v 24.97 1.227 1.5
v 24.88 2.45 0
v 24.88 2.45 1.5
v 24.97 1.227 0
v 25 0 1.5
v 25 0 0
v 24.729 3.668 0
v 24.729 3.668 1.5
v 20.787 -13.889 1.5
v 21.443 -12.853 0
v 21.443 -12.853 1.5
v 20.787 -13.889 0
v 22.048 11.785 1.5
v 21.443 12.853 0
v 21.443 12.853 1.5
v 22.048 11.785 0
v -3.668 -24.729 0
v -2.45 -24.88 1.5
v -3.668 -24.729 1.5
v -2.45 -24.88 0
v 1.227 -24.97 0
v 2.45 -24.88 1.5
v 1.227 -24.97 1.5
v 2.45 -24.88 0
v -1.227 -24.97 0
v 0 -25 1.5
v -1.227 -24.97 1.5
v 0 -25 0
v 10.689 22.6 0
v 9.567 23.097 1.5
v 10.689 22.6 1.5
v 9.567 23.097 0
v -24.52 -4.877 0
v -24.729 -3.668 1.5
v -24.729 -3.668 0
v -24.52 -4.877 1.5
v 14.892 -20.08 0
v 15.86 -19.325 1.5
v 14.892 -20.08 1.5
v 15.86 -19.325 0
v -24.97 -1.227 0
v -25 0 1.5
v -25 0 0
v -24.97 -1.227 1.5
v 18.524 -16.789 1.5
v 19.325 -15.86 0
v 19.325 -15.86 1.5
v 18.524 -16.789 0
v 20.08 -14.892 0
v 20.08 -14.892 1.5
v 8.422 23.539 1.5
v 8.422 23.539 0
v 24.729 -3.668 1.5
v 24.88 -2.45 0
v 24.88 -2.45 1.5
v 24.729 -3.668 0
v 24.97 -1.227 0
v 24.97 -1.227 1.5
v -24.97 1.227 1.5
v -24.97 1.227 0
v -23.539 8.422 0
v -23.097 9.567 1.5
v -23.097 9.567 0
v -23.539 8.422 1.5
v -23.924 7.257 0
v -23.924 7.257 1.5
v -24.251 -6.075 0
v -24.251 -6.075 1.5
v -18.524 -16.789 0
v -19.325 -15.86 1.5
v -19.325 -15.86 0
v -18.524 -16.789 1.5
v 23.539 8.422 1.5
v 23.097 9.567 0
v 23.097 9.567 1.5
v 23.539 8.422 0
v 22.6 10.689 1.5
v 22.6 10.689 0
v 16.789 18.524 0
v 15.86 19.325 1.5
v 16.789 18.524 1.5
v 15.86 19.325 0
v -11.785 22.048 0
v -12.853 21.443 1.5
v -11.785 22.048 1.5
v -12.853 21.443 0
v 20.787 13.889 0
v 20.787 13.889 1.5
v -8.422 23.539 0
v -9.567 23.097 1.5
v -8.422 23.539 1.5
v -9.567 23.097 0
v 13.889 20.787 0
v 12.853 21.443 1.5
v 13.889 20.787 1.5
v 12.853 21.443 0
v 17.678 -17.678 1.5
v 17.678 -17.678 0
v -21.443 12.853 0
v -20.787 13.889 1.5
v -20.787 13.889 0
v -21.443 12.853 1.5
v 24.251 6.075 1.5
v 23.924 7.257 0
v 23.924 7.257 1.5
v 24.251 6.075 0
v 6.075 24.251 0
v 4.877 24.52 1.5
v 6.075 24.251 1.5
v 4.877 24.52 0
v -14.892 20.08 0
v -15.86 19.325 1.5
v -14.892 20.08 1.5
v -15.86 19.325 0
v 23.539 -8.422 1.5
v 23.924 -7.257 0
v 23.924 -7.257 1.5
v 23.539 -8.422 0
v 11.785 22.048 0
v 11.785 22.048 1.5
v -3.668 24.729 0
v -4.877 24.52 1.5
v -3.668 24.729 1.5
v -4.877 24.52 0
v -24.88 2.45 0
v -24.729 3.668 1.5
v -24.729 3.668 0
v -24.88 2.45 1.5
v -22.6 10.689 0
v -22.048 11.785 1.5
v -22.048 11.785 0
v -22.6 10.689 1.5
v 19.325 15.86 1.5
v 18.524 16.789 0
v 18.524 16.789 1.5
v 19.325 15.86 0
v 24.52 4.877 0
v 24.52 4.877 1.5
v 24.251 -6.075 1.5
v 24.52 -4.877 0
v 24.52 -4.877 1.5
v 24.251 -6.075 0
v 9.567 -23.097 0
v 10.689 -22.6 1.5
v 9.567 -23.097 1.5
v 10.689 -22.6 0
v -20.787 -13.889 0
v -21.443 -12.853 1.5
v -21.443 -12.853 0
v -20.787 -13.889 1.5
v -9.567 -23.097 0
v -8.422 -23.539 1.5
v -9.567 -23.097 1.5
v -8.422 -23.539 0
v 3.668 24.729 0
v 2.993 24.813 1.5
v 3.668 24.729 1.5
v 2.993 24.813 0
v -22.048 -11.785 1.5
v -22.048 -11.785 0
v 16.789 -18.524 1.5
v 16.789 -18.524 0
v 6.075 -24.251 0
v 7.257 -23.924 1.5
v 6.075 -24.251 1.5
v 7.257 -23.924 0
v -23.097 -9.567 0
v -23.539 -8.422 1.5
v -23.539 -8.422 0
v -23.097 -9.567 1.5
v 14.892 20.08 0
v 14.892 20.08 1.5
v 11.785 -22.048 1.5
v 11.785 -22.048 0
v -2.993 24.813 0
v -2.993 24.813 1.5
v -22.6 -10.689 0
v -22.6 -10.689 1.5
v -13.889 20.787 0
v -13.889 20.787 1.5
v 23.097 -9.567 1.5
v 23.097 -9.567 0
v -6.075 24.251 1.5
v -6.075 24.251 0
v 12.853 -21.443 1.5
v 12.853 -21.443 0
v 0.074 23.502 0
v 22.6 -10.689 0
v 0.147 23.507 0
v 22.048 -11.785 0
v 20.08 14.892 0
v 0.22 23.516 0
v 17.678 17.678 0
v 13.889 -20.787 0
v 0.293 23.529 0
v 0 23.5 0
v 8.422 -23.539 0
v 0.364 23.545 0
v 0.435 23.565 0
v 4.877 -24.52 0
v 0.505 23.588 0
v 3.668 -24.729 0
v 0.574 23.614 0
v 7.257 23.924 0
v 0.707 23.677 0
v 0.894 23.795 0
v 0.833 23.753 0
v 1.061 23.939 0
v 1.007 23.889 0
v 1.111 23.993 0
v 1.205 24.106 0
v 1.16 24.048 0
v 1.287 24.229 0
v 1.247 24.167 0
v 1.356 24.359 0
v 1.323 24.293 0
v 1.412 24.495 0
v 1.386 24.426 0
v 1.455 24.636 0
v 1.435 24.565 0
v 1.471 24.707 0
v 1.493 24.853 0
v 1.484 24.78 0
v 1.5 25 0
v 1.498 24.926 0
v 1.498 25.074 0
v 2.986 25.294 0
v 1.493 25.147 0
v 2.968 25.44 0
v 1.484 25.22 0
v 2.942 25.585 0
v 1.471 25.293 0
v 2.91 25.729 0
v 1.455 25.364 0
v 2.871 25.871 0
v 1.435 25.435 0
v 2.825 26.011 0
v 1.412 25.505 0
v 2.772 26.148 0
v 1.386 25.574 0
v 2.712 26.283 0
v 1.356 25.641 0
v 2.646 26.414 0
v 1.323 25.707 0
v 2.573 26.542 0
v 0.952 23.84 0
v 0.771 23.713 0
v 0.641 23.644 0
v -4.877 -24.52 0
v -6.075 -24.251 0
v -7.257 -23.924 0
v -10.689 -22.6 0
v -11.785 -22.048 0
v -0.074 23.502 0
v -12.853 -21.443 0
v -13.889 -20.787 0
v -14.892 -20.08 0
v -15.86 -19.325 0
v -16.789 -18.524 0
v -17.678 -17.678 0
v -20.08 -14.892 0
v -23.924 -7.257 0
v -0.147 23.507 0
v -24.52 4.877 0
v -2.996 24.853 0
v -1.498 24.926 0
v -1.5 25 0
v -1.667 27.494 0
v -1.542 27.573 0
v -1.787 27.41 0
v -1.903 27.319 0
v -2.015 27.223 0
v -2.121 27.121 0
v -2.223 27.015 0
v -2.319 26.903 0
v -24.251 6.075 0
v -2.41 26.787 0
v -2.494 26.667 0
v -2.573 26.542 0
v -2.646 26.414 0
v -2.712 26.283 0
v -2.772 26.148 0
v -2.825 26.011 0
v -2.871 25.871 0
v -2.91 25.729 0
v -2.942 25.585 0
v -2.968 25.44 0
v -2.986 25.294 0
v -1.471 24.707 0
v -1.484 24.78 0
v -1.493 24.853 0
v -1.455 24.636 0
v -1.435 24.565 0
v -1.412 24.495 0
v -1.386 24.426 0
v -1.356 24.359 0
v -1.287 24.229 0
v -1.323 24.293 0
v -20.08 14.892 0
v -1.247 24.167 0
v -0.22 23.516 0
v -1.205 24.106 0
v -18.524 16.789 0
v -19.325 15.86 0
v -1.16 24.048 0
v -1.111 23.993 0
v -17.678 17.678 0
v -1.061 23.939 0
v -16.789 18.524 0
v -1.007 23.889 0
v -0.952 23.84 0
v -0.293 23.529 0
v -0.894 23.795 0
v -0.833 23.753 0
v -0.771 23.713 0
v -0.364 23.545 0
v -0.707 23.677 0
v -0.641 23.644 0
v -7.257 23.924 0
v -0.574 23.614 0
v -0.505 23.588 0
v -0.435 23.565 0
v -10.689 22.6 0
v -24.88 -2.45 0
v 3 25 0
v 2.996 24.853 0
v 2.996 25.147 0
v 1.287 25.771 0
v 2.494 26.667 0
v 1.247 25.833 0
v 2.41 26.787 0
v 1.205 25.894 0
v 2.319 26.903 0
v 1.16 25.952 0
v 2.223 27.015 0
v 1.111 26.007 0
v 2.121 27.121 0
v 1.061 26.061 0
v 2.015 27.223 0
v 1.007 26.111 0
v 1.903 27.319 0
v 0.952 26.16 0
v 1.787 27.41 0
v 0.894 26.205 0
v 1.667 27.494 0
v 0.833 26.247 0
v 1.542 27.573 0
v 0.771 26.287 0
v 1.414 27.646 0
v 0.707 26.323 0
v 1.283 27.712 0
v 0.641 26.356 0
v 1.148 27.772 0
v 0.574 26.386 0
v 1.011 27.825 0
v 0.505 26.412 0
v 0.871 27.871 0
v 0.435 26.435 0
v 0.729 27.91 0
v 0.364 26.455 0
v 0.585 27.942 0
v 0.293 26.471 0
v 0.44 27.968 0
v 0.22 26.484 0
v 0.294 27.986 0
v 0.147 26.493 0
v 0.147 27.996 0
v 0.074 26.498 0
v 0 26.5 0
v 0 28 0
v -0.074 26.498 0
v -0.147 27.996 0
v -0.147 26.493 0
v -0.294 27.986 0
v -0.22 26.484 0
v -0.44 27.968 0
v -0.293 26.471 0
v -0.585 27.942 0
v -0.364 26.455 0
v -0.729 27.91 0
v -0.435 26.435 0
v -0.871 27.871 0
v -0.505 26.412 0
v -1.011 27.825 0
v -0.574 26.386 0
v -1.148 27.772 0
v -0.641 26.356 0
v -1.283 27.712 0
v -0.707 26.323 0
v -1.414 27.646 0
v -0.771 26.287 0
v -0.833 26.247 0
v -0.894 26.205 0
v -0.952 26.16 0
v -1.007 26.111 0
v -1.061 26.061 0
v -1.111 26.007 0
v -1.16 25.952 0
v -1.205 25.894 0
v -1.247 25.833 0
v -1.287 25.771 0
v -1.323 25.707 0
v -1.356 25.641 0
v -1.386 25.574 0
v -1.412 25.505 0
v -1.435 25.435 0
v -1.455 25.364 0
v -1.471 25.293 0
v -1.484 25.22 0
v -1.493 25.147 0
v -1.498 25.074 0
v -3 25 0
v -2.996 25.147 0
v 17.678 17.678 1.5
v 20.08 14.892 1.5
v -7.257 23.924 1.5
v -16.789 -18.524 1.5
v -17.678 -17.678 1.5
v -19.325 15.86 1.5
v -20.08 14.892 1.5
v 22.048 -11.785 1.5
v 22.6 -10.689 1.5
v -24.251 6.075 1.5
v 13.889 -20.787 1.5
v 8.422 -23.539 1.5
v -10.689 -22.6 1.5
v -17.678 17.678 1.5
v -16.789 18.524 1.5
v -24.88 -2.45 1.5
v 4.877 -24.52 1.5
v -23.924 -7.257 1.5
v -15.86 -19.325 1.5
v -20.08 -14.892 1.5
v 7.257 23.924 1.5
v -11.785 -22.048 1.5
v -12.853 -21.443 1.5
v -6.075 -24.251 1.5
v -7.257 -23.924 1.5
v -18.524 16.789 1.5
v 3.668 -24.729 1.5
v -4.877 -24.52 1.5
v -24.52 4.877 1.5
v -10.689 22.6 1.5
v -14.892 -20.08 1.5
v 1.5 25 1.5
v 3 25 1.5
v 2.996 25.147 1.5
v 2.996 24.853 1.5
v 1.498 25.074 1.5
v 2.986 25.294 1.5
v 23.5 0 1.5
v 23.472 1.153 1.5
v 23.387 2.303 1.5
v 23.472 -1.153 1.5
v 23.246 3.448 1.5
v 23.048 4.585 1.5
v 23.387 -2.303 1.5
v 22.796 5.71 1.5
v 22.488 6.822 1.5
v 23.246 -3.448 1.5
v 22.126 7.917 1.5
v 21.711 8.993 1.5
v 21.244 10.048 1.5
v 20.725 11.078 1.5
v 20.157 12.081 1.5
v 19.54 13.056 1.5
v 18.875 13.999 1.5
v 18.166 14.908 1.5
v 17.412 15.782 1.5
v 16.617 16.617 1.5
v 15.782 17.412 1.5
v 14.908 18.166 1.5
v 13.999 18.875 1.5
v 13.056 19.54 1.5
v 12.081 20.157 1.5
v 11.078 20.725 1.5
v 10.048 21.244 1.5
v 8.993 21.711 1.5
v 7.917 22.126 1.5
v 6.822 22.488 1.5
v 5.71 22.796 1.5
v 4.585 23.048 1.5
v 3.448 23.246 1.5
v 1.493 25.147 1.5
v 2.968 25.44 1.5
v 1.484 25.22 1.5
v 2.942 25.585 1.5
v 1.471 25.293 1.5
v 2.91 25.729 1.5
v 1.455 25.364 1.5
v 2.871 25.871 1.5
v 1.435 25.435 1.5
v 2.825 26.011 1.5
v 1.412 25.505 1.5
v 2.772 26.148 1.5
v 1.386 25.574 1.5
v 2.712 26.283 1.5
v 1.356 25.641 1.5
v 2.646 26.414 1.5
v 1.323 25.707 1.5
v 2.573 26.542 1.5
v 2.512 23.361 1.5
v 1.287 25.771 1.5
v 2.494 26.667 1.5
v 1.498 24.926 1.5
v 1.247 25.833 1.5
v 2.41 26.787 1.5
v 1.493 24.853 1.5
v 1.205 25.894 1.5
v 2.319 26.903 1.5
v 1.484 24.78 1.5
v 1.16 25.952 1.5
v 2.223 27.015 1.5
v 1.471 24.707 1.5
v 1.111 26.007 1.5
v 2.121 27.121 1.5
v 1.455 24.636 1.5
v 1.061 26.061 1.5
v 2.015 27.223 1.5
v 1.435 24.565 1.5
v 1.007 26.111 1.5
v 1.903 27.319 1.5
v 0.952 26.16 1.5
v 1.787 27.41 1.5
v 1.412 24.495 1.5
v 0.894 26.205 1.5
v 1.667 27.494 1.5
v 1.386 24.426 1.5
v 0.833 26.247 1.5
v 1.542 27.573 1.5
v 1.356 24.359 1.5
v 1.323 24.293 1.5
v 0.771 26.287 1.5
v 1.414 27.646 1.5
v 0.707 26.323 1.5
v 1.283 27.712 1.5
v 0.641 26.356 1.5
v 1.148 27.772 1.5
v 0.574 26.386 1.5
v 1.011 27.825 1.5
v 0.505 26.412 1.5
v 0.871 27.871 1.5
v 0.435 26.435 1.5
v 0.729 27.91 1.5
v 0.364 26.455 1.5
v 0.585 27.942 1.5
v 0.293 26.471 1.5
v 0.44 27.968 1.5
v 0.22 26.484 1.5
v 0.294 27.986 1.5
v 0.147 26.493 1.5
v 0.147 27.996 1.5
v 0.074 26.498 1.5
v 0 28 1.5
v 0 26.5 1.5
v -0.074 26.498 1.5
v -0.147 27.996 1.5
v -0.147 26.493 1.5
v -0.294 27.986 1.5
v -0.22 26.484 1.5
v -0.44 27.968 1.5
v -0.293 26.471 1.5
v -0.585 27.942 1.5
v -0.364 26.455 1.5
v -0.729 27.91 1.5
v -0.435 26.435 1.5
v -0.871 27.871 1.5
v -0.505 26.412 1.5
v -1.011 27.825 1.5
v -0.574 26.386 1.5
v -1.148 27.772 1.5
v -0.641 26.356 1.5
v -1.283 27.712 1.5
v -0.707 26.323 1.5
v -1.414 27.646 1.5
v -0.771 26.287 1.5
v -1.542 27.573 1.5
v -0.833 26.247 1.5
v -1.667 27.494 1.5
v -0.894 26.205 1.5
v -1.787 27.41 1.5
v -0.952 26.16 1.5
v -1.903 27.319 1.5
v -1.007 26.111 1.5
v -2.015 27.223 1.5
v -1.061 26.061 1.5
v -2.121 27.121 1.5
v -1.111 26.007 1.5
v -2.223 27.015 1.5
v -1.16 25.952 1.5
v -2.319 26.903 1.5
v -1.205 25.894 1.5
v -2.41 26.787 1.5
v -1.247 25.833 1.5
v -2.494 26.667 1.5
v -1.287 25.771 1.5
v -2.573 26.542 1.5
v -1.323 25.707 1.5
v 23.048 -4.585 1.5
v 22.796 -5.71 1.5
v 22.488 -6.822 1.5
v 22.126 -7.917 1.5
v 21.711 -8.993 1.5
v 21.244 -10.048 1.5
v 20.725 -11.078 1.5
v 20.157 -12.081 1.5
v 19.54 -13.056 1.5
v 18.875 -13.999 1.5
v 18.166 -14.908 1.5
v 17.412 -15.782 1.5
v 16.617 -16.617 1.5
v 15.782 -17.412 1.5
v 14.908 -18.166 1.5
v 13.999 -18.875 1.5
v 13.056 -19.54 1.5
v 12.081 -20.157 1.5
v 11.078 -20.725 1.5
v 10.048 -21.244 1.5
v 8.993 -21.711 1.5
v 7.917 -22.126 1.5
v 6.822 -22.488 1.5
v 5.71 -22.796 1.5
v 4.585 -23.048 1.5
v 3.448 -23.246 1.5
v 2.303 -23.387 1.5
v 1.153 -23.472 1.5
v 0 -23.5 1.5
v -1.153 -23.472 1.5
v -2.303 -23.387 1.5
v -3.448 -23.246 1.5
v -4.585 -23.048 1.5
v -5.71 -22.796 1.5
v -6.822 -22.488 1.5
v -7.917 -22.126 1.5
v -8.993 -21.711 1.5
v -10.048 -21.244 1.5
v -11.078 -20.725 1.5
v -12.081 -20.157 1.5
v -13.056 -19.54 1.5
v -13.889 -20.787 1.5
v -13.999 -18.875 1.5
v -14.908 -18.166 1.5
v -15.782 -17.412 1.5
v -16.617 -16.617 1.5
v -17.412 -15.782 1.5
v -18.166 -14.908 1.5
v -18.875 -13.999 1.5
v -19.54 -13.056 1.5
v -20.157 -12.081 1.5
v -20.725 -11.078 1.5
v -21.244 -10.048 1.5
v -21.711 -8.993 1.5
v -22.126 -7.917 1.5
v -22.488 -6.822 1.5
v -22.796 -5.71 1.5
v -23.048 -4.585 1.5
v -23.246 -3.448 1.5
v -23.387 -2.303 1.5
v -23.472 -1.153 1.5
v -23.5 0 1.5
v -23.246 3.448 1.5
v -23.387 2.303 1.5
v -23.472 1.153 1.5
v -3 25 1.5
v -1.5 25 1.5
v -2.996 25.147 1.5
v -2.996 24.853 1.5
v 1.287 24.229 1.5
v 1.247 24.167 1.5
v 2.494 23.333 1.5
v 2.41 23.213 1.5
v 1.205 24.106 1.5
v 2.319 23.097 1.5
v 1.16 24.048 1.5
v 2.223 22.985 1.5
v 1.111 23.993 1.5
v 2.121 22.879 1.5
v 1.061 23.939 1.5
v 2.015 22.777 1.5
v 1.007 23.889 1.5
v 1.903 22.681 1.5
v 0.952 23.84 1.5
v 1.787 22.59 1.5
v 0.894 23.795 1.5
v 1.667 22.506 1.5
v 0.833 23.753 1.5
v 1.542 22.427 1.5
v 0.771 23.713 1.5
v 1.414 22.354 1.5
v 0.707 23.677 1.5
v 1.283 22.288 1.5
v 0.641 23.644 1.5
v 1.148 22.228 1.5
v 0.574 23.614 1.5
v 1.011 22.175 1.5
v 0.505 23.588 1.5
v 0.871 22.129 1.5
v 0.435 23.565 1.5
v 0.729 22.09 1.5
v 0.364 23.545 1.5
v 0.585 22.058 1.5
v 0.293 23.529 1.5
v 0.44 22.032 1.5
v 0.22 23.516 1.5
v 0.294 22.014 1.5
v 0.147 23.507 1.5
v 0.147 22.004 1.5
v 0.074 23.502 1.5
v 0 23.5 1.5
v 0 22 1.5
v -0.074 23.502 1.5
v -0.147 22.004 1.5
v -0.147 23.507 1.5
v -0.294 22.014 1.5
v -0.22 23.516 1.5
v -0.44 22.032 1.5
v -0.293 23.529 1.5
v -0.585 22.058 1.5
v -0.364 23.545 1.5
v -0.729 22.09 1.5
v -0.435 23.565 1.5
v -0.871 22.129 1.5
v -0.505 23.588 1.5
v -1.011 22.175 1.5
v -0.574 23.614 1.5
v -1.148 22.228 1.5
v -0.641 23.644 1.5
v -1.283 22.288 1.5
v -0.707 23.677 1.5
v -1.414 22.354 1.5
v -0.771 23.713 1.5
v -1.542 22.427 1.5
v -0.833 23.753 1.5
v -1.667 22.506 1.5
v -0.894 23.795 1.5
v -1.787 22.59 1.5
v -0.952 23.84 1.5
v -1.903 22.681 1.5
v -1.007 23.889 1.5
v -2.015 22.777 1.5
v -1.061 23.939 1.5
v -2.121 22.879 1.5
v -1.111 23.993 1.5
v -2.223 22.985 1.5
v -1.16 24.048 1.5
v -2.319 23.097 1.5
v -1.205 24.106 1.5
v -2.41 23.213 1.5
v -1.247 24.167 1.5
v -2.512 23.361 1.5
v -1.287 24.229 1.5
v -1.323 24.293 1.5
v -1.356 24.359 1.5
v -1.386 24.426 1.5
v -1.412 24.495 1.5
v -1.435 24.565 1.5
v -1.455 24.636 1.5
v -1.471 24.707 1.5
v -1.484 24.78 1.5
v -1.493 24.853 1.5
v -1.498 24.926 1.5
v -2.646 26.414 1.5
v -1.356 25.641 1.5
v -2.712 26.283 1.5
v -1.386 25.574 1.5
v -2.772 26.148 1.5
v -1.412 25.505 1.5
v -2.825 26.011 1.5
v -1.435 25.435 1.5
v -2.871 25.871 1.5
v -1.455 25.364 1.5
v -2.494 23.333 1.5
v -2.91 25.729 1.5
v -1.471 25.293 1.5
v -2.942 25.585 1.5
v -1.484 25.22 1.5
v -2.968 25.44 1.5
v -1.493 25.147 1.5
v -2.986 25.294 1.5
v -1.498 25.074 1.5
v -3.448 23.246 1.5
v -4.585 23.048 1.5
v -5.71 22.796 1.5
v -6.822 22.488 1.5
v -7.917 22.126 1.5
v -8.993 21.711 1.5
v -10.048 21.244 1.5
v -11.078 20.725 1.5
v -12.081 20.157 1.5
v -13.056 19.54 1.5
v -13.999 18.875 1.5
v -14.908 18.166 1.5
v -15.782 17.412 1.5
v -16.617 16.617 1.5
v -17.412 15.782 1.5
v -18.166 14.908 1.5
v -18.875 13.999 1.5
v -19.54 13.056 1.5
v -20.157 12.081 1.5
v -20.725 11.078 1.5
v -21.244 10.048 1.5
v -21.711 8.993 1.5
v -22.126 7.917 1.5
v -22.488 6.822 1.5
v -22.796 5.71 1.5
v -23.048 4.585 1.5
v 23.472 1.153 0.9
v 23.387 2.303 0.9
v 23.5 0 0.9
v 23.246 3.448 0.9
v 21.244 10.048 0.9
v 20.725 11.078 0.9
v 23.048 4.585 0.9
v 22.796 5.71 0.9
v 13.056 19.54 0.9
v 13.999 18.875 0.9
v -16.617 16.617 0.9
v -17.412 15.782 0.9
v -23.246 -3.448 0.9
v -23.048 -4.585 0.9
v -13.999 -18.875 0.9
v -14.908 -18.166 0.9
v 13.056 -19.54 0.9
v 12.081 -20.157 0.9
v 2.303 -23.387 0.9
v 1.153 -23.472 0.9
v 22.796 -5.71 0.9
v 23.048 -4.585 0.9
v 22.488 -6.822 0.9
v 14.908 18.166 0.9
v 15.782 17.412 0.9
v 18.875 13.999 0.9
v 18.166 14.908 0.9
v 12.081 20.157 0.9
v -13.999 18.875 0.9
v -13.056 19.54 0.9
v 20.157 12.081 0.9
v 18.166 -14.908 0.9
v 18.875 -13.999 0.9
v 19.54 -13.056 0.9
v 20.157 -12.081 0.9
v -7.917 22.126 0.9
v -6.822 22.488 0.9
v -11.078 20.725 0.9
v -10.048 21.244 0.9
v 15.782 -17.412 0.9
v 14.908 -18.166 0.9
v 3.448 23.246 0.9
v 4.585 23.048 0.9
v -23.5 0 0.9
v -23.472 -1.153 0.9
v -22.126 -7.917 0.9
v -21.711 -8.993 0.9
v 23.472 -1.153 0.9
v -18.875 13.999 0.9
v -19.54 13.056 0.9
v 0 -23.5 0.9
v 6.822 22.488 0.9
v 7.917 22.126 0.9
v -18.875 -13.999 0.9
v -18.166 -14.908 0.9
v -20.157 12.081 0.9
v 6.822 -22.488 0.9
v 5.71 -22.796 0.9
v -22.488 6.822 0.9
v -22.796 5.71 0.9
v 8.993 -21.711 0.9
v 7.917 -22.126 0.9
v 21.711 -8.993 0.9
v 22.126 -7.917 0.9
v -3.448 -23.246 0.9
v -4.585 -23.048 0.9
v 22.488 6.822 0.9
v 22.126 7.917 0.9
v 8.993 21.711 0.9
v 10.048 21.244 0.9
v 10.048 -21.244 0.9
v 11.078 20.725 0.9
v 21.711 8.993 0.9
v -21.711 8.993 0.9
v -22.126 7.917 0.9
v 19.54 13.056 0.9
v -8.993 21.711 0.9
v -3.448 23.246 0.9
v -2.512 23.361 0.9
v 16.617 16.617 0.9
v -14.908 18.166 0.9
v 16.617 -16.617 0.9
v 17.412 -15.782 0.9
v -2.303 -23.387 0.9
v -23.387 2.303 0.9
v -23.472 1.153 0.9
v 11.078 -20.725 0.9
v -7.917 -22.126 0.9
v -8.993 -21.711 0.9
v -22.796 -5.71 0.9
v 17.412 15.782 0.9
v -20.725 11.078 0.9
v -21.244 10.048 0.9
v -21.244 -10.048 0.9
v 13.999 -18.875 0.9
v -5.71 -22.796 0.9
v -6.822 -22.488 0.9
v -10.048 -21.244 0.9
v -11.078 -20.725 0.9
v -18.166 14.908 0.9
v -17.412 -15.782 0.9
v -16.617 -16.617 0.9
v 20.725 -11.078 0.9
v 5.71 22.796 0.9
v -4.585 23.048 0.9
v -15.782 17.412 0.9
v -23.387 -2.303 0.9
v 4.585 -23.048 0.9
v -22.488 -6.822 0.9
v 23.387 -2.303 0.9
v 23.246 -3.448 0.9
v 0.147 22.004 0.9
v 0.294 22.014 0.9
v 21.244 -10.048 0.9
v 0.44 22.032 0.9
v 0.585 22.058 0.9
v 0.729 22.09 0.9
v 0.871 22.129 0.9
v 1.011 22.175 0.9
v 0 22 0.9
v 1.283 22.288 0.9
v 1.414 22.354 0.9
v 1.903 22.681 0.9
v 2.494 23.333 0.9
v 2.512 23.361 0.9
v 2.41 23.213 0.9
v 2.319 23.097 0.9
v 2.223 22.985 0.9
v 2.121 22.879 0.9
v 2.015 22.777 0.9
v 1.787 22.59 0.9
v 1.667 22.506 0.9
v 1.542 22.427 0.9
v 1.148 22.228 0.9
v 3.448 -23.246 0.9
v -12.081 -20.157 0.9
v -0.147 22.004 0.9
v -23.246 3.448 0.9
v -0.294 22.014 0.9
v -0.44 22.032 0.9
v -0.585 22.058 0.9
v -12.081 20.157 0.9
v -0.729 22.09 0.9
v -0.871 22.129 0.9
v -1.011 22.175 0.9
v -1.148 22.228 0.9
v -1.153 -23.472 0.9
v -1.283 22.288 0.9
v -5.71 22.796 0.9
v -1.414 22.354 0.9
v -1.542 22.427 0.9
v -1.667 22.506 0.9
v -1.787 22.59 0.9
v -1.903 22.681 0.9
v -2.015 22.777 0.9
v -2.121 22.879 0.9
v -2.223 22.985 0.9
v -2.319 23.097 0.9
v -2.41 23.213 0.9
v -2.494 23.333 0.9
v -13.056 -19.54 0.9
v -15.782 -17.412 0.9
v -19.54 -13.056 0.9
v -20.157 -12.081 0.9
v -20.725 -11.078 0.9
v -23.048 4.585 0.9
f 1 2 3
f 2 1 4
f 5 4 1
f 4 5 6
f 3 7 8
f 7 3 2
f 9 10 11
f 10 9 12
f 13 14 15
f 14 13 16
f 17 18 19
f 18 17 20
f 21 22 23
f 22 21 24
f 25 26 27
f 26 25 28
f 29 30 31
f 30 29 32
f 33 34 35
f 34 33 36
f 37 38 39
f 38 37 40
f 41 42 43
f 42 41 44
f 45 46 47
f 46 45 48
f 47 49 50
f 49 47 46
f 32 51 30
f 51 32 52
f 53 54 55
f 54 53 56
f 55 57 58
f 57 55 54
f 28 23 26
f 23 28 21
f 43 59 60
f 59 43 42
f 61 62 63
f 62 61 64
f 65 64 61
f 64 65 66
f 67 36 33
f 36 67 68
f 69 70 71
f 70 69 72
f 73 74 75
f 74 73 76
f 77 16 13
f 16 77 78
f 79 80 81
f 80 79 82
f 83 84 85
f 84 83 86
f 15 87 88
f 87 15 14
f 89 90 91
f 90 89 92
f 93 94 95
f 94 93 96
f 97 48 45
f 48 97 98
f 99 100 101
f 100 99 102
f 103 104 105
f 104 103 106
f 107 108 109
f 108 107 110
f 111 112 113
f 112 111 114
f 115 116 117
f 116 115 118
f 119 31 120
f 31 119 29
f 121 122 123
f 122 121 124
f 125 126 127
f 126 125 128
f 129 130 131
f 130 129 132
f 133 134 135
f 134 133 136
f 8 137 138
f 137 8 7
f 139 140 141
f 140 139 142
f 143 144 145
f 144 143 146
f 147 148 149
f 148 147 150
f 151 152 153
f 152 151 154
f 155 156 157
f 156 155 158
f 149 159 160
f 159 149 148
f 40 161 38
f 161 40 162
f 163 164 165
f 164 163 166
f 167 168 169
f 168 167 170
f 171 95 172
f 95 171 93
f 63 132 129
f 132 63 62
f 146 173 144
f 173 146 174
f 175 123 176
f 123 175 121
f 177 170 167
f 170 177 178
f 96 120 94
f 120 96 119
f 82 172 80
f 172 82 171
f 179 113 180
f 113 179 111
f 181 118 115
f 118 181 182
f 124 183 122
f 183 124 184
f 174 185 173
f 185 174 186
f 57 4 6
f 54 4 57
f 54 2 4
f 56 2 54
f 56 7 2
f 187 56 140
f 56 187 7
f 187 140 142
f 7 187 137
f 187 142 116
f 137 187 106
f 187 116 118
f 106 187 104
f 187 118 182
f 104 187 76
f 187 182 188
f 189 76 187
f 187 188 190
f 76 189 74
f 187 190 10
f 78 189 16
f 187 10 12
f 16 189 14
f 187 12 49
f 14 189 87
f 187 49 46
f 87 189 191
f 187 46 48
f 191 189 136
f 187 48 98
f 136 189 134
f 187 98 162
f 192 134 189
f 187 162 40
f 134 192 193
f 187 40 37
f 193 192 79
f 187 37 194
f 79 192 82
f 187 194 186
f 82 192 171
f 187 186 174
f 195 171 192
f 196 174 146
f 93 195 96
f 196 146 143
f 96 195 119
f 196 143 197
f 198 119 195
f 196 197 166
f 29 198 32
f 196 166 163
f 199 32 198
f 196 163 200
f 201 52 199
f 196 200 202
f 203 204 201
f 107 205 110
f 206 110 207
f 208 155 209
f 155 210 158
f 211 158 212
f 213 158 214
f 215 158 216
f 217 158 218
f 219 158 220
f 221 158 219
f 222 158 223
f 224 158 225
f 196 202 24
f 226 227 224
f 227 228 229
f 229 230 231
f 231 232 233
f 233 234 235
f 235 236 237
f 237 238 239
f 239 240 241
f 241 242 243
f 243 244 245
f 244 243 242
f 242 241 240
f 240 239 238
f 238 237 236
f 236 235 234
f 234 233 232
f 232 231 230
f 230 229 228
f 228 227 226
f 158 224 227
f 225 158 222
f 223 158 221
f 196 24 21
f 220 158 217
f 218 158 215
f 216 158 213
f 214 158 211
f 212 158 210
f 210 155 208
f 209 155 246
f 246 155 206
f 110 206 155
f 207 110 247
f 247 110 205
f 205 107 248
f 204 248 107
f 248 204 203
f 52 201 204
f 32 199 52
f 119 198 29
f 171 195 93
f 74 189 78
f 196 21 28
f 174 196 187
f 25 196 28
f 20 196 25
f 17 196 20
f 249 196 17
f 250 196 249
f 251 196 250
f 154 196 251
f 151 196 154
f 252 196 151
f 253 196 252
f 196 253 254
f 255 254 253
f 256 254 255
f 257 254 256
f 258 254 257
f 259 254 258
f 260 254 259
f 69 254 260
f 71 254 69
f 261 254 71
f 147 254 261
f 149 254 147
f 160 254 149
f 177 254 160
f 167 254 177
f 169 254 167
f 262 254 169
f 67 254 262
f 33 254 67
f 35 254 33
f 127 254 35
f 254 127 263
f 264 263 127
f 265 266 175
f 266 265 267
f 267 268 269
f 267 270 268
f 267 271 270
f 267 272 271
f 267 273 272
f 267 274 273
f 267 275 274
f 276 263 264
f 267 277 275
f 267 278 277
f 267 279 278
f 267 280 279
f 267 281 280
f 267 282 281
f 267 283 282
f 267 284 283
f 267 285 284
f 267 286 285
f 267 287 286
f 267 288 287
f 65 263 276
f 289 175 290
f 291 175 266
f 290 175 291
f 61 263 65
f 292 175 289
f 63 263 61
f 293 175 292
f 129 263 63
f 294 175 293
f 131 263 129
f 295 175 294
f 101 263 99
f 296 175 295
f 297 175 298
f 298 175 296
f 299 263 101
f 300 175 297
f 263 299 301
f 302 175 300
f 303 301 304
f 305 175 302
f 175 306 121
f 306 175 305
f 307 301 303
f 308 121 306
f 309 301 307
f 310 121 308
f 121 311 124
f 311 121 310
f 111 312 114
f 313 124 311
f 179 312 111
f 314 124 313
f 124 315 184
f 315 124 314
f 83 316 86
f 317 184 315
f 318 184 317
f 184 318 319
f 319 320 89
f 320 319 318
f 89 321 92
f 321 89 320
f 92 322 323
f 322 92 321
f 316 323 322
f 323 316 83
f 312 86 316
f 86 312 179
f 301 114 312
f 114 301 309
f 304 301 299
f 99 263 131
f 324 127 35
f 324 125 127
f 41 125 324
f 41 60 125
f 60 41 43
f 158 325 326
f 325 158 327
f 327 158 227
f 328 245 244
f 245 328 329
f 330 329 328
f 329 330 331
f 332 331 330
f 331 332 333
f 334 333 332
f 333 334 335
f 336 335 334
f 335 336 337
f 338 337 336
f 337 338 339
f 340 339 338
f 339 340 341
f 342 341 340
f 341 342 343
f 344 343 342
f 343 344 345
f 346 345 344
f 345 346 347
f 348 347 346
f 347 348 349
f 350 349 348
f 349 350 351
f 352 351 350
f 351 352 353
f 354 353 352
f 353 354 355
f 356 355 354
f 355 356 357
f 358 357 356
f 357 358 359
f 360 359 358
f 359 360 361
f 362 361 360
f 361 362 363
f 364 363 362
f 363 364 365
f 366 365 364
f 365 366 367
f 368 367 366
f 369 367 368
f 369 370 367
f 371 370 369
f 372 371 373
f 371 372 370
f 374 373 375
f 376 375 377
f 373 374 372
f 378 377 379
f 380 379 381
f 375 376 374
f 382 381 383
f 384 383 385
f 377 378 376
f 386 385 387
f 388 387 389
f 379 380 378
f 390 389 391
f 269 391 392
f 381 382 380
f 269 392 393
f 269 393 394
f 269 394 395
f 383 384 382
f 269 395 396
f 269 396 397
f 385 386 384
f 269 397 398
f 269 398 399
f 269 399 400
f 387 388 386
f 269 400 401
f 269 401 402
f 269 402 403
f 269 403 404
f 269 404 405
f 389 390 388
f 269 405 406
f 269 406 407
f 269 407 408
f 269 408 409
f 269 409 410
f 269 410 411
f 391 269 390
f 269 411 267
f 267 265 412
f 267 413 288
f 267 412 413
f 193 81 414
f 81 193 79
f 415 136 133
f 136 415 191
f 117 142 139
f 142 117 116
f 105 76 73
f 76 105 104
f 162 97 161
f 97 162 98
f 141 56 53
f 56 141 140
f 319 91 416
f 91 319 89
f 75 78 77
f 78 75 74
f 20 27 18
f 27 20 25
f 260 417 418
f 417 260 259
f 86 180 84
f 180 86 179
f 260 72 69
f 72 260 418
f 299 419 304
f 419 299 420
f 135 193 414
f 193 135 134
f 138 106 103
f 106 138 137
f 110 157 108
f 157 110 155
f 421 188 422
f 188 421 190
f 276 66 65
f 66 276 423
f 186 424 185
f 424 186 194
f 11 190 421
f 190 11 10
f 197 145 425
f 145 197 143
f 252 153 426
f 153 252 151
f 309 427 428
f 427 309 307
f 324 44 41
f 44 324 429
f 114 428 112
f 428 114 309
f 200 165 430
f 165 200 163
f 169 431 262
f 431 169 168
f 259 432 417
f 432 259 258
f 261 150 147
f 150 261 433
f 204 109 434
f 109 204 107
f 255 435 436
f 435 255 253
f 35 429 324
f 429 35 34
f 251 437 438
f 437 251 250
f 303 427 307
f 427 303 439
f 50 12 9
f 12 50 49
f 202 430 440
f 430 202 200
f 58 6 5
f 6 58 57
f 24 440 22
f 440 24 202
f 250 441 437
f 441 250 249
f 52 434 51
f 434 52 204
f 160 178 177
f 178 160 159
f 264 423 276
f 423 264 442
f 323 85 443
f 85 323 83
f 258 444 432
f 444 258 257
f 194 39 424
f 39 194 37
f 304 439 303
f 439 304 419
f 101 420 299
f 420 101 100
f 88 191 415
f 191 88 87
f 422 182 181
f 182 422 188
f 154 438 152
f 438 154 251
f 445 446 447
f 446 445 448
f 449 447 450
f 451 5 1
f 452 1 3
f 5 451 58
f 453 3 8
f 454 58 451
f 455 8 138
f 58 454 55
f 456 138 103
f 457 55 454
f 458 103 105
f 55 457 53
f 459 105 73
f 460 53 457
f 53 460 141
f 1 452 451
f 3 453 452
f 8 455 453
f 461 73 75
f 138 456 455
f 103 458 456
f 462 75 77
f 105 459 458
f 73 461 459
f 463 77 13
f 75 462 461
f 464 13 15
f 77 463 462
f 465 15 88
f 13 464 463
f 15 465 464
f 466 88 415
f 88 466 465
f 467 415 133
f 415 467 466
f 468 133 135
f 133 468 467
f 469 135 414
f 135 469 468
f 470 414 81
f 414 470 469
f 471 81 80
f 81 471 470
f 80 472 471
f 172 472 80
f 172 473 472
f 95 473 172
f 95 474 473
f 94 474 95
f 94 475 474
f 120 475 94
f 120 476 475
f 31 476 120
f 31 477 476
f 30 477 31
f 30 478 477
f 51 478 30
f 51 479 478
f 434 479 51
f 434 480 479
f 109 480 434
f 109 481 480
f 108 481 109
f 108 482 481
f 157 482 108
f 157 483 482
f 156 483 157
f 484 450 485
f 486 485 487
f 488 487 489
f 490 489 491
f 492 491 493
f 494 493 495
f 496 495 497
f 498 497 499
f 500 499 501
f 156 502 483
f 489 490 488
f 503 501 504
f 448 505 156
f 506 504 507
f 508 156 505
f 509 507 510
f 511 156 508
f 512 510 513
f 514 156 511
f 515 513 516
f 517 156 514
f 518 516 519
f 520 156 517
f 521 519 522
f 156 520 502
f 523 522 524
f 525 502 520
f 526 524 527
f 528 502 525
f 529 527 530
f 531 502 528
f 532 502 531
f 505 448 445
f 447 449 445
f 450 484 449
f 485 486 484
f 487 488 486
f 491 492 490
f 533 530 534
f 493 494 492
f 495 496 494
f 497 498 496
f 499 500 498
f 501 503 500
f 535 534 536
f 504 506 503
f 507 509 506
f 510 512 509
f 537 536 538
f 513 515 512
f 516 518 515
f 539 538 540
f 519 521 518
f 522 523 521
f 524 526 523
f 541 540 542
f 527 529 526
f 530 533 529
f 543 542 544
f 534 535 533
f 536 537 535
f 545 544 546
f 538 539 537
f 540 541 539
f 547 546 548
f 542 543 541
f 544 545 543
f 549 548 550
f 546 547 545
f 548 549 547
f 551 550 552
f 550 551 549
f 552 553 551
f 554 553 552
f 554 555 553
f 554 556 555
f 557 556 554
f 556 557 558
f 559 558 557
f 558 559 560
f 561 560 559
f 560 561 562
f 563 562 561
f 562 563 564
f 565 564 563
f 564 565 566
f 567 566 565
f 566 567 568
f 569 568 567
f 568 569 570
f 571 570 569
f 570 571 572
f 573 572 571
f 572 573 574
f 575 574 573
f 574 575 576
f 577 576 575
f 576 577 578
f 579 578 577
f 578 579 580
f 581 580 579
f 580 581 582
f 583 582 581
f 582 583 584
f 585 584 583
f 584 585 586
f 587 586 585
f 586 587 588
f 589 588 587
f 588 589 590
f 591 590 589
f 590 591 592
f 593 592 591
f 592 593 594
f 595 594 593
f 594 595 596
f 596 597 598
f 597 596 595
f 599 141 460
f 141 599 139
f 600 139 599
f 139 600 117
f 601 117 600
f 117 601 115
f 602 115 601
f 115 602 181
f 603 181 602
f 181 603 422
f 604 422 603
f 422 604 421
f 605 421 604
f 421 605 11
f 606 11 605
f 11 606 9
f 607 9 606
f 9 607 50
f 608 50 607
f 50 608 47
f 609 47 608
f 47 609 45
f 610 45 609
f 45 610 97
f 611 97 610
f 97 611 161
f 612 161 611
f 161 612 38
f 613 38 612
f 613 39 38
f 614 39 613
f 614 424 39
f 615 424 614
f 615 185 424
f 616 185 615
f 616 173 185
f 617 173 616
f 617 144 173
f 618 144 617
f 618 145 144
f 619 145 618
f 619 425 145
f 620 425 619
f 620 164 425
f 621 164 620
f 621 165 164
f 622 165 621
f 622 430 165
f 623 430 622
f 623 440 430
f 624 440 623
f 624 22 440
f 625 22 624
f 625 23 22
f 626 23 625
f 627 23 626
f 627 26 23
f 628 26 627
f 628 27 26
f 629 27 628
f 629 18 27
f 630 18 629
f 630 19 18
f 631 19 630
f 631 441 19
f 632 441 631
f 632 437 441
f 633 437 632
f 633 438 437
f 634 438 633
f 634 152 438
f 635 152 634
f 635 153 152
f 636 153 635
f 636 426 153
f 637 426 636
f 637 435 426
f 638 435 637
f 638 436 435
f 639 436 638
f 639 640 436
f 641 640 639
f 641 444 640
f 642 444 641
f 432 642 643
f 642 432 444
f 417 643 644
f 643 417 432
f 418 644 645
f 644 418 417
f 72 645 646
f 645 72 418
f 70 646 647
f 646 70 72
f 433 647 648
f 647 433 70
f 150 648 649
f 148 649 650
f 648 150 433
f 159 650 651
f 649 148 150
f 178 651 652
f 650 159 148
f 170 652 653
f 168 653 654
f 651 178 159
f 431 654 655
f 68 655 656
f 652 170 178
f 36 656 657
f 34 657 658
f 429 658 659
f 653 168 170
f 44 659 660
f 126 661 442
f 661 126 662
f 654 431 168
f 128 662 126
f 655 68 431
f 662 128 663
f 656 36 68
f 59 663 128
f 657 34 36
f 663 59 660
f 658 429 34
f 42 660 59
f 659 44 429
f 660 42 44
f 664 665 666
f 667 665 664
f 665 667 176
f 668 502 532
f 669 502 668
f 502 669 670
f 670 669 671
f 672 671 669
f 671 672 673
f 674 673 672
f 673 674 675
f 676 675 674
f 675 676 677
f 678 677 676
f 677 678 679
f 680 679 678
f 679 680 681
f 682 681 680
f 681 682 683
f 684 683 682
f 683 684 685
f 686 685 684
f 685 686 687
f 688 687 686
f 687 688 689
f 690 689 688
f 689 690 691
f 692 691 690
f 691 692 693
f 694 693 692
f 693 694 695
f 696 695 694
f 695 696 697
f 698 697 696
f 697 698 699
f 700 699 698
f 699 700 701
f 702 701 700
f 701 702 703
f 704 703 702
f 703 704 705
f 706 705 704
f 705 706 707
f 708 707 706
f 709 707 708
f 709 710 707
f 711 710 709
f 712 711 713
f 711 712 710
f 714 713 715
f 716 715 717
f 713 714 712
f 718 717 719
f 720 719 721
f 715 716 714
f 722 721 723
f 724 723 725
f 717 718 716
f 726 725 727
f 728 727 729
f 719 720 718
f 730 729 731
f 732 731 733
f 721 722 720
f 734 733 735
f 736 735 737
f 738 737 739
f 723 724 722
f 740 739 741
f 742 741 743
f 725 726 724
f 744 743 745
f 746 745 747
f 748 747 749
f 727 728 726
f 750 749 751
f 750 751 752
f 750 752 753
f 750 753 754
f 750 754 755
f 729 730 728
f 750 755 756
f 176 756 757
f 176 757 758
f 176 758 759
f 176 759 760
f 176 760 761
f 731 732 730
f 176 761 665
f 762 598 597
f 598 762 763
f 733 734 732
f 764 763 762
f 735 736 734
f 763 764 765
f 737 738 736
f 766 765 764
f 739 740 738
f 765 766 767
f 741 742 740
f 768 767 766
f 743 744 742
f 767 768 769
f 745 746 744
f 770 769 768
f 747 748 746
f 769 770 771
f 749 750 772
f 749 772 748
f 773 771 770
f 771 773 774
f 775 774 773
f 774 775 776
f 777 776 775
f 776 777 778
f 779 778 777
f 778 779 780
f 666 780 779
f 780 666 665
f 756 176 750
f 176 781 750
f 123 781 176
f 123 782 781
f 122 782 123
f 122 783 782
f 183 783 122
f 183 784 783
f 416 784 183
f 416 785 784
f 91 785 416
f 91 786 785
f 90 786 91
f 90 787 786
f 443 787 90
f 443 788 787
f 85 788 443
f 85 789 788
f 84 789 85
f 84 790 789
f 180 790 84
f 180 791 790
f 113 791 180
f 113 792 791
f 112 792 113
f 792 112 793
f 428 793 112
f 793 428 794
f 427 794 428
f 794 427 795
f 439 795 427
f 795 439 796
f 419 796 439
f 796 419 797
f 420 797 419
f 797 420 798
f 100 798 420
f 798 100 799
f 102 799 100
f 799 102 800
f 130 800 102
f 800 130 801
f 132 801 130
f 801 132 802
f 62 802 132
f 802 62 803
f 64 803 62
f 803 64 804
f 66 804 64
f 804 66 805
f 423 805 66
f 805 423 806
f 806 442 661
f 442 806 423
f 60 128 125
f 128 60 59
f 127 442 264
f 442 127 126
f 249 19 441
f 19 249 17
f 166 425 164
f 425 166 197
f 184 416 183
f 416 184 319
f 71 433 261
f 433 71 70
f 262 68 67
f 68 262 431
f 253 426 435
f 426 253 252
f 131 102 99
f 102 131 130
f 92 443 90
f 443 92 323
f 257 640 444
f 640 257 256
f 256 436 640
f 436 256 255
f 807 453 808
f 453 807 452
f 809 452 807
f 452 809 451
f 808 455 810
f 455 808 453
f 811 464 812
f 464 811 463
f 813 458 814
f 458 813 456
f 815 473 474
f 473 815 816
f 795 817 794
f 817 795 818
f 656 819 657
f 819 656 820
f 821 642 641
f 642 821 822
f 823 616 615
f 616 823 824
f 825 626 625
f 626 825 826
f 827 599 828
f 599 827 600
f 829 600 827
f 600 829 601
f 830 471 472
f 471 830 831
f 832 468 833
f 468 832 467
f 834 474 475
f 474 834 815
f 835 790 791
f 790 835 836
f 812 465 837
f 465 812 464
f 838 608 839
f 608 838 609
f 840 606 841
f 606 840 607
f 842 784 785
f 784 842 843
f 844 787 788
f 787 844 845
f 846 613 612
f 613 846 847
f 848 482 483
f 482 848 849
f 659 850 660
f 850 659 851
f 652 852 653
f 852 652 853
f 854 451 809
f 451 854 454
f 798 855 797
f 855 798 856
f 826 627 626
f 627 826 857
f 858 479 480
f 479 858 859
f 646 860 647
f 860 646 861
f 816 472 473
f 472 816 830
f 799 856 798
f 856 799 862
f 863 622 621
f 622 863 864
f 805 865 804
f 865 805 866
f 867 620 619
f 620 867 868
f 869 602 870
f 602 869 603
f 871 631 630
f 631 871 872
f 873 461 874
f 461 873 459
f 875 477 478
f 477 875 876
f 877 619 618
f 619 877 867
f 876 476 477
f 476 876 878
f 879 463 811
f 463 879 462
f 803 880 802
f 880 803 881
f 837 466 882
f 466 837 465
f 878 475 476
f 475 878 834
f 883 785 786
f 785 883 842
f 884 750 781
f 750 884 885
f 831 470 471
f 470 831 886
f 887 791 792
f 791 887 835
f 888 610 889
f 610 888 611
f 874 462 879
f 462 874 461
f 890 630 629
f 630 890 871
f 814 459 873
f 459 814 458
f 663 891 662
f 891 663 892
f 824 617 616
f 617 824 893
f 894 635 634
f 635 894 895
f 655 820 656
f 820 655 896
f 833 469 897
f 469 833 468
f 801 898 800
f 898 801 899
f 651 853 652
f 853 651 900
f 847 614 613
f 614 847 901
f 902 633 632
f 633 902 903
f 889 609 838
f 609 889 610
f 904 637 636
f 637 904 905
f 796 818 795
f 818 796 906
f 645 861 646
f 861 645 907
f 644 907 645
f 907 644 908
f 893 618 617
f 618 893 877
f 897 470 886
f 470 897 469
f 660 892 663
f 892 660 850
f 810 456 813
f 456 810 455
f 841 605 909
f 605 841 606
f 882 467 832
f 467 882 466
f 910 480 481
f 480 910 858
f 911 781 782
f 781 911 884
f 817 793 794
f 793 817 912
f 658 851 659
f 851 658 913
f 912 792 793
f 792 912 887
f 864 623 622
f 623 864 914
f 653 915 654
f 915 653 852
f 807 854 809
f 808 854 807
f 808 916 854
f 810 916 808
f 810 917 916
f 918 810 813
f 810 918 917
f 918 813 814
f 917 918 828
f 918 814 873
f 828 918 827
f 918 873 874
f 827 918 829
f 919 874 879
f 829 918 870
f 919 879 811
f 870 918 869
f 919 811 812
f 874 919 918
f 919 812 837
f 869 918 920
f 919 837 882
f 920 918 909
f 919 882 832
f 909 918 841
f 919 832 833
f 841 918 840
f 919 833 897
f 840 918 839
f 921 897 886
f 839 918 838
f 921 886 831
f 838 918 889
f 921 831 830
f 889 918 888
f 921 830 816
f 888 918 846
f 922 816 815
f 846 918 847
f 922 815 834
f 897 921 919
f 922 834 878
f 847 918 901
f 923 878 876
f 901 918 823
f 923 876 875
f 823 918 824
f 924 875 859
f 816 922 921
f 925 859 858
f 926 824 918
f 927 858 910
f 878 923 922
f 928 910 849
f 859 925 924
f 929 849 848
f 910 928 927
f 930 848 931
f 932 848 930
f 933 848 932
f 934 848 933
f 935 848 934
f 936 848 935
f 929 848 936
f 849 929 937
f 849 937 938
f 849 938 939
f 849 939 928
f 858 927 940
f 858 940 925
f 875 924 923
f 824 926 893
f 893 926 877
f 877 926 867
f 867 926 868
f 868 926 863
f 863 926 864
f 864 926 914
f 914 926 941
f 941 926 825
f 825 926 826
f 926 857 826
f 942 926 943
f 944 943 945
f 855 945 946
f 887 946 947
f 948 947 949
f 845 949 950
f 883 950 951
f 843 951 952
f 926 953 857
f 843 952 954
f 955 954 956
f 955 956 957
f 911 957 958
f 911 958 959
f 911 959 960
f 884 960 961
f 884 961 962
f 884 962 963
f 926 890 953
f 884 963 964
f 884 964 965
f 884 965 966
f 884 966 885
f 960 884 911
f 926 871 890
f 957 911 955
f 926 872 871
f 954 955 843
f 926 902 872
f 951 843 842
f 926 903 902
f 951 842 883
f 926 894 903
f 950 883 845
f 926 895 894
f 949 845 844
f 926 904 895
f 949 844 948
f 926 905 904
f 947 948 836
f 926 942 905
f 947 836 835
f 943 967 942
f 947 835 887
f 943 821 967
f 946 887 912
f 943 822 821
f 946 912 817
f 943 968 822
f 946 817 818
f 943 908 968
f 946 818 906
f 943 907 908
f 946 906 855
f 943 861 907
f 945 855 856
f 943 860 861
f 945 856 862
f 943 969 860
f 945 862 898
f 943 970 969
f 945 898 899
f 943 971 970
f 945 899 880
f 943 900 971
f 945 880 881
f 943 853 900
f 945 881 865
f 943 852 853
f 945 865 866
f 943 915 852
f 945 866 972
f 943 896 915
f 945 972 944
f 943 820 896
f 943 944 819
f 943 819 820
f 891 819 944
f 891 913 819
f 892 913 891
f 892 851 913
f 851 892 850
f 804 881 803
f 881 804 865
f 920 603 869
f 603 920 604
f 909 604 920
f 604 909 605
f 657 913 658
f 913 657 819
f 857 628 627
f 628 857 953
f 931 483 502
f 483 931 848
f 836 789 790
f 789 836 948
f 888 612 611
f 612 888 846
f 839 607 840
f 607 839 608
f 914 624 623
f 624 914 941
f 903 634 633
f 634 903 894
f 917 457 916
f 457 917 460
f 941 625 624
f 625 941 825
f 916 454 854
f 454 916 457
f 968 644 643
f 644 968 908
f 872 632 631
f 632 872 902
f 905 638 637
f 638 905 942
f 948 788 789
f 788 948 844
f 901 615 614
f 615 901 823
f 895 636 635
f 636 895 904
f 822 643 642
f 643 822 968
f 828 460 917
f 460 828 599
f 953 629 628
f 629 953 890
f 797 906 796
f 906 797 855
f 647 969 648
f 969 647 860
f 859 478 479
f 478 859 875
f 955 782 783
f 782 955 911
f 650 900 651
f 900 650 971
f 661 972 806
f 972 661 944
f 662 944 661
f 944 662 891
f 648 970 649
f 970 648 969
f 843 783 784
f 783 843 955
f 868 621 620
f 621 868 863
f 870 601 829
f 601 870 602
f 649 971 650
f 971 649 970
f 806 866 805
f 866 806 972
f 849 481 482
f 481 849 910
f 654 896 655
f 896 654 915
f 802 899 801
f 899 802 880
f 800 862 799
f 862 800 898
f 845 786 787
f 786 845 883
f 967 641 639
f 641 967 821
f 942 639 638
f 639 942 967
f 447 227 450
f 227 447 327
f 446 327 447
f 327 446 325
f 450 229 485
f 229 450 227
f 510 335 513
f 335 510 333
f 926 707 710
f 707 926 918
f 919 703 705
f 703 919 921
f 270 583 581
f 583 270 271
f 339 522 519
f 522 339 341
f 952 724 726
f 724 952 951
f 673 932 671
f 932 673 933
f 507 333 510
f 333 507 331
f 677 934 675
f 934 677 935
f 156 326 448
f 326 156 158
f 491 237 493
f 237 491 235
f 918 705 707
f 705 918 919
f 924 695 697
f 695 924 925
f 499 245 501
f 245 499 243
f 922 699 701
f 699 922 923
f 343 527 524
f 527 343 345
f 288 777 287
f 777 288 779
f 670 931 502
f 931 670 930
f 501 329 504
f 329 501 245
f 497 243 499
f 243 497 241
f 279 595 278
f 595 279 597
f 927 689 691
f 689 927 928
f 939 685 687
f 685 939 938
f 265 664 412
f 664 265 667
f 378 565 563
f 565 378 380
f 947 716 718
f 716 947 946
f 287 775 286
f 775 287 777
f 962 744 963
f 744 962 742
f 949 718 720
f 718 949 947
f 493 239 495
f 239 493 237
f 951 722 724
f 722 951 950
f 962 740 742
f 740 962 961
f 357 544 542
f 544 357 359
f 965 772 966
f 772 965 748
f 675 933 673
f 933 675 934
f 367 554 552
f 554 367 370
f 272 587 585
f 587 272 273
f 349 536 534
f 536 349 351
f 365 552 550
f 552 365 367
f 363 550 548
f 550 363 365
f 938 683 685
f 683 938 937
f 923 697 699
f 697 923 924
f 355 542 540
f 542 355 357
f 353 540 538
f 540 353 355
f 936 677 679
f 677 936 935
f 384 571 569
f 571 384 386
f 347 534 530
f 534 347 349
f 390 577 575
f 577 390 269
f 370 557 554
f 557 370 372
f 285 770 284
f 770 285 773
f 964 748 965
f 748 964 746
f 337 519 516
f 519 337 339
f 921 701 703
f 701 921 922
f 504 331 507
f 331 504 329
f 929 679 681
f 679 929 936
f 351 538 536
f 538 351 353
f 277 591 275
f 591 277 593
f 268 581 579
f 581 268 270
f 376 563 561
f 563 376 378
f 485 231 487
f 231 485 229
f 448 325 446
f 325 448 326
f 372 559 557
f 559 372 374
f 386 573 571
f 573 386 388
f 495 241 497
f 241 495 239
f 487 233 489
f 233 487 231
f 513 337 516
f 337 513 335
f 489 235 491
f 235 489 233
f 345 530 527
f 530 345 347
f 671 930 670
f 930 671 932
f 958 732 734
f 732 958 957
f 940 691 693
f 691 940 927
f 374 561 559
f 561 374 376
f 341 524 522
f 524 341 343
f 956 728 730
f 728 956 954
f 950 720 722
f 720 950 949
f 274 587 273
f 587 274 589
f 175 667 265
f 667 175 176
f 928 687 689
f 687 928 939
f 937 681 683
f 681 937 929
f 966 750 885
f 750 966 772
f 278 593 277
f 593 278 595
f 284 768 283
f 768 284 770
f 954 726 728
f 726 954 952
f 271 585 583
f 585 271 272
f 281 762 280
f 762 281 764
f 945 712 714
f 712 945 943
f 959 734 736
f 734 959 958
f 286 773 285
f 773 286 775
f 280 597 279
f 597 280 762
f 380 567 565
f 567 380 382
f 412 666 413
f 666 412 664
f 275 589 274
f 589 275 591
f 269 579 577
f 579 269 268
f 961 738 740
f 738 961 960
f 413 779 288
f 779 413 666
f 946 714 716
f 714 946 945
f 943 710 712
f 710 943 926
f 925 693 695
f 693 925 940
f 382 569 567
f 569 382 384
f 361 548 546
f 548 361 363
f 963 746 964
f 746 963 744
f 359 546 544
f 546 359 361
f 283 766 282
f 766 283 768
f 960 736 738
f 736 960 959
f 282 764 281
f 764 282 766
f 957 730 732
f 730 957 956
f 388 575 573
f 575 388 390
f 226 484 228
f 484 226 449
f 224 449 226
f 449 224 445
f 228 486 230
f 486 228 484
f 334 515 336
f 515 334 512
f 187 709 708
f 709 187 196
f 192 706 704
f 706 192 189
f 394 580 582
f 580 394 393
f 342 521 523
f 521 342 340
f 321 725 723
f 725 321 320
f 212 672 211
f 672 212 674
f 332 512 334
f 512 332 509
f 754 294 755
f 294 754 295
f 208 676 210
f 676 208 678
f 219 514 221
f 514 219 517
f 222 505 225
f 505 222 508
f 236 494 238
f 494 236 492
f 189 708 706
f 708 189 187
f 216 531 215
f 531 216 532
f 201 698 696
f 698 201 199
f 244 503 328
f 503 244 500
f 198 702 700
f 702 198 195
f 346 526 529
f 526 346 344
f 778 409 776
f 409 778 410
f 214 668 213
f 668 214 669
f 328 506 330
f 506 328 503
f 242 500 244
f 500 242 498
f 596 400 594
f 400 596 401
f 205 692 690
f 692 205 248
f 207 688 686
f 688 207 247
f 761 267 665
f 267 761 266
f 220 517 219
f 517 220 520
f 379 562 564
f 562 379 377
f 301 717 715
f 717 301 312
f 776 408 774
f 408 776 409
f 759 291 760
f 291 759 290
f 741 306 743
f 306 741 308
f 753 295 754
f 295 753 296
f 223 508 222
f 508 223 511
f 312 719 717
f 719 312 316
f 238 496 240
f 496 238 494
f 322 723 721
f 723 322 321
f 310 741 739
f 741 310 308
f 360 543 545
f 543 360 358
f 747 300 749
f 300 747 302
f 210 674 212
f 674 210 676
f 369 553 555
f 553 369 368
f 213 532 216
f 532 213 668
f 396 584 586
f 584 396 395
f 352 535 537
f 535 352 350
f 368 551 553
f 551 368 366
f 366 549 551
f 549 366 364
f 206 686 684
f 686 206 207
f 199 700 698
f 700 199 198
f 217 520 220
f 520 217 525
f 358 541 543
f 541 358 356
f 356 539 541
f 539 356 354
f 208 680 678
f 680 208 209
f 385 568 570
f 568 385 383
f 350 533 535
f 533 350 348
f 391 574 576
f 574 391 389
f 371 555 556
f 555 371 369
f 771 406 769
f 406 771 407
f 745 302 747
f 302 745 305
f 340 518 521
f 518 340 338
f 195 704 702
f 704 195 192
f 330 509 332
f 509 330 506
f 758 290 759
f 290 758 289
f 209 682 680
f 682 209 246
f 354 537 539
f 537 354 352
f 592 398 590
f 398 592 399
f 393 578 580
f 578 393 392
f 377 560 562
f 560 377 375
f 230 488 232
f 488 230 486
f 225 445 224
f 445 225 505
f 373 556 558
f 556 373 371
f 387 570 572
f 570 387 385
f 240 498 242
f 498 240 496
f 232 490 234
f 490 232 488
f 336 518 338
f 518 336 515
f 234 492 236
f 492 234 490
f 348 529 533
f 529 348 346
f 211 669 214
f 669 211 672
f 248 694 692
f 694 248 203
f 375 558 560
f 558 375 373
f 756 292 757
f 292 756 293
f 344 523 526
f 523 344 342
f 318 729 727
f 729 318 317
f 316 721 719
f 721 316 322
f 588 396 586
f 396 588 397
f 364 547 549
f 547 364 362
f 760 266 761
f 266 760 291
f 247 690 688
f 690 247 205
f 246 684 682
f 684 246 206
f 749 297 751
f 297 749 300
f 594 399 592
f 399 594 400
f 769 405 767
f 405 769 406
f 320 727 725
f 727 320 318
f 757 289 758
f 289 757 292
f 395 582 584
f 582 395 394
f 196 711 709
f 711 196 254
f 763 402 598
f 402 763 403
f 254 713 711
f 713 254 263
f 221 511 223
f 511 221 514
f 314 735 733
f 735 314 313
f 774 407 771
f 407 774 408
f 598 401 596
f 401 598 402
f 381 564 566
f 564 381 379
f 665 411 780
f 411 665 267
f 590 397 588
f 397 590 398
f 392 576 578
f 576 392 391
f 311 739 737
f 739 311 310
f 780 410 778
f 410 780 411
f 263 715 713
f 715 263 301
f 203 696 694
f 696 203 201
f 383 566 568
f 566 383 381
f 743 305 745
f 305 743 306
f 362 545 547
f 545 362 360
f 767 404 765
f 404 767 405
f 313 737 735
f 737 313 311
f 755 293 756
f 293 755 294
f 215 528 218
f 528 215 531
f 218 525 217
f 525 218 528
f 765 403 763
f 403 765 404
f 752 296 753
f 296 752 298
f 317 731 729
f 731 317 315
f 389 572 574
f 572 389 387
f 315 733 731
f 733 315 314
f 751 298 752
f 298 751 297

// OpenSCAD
//cube();

S=.11;
H=.9;
D=50;

H1=.9;
H2=H1+.6;
//translate([0,-40,0])



difference() {
    union() {
        difference() {
            color([1,0,0])
            cylinder($fn=128,d=D,h=H2);
            translate([0,0,H1])
            color([1,0,0])
            cylinder($fn=128,d=D-2*1.5,h=H2);
        }



        translate([0,D/2,0])
        color([1,0,0])
        cylinder($fn=128,d=6,h=H2);
        
    }
    
        translate([0,D/2,0])
        color([1,0,0])
        cylinder($fn=128,d=3,h=10,center=true);
}


linear_extrude(height = H2, convexity = 10)
scale(S)
translate([-170,-170,0])
import("media/kinga_rajz_out.dxf");


//linear_extrude(height = 1, center = true, convexity = 10)
//   import (file = "a1.dxf", layer = "fan_top");
